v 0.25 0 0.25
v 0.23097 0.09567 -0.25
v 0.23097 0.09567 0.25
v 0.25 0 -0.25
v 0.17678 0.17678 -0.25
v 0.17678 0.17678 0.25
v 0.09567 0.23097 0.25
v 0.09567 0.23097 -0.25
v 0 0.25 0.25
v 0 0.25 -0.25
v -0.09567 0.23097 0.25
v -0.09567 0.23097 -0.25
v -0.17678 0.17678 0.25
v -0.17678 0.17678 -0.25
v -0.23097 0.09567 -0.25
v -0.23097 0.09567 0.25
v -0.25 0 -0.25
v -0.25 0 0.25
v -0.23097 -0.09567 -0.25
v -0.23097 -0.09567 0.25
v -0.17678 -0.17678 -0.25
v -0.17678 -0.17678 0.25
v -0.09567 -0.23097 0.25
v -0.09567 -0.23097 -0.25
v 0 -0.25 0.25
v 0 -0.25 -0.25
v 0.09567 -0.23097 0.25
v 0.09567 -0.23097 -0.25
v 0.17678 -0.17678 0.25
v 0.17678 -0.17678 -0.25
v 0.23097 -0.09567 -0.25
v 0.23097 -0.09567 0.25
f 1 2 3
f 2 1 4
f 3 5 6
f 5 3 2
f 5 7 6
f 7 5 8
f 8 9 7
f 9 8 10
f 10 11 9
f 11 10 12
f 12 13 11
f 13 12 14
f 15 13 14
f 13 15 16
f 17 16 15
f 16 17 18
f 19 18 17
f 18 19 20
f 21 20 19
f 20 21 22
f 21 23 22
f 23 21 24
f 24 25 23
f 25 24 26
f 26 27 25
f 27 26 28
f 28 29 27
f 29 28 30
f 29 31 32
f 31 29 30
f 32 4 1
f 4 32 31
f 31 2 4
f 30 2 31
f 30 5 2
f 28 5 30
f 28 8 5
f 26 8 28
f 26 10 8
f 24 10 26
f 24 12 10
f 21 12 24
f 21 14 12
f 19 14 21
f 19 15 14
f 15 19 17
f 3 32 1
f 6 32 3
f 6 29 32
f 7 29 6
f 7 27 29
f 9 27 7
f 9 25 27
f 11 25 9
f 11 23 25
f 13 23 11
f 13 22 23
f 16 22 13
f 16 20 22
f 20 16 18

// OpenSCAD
use <lib.scad>

module roll() {
	cyl(0.25, 0.25, 0.5);
}

module end() {
	cyl(0.3, 0.3, 0.01);
}

hd = 32;
ld = 16;

roll($fn=ld);
//end($fn=hd);
